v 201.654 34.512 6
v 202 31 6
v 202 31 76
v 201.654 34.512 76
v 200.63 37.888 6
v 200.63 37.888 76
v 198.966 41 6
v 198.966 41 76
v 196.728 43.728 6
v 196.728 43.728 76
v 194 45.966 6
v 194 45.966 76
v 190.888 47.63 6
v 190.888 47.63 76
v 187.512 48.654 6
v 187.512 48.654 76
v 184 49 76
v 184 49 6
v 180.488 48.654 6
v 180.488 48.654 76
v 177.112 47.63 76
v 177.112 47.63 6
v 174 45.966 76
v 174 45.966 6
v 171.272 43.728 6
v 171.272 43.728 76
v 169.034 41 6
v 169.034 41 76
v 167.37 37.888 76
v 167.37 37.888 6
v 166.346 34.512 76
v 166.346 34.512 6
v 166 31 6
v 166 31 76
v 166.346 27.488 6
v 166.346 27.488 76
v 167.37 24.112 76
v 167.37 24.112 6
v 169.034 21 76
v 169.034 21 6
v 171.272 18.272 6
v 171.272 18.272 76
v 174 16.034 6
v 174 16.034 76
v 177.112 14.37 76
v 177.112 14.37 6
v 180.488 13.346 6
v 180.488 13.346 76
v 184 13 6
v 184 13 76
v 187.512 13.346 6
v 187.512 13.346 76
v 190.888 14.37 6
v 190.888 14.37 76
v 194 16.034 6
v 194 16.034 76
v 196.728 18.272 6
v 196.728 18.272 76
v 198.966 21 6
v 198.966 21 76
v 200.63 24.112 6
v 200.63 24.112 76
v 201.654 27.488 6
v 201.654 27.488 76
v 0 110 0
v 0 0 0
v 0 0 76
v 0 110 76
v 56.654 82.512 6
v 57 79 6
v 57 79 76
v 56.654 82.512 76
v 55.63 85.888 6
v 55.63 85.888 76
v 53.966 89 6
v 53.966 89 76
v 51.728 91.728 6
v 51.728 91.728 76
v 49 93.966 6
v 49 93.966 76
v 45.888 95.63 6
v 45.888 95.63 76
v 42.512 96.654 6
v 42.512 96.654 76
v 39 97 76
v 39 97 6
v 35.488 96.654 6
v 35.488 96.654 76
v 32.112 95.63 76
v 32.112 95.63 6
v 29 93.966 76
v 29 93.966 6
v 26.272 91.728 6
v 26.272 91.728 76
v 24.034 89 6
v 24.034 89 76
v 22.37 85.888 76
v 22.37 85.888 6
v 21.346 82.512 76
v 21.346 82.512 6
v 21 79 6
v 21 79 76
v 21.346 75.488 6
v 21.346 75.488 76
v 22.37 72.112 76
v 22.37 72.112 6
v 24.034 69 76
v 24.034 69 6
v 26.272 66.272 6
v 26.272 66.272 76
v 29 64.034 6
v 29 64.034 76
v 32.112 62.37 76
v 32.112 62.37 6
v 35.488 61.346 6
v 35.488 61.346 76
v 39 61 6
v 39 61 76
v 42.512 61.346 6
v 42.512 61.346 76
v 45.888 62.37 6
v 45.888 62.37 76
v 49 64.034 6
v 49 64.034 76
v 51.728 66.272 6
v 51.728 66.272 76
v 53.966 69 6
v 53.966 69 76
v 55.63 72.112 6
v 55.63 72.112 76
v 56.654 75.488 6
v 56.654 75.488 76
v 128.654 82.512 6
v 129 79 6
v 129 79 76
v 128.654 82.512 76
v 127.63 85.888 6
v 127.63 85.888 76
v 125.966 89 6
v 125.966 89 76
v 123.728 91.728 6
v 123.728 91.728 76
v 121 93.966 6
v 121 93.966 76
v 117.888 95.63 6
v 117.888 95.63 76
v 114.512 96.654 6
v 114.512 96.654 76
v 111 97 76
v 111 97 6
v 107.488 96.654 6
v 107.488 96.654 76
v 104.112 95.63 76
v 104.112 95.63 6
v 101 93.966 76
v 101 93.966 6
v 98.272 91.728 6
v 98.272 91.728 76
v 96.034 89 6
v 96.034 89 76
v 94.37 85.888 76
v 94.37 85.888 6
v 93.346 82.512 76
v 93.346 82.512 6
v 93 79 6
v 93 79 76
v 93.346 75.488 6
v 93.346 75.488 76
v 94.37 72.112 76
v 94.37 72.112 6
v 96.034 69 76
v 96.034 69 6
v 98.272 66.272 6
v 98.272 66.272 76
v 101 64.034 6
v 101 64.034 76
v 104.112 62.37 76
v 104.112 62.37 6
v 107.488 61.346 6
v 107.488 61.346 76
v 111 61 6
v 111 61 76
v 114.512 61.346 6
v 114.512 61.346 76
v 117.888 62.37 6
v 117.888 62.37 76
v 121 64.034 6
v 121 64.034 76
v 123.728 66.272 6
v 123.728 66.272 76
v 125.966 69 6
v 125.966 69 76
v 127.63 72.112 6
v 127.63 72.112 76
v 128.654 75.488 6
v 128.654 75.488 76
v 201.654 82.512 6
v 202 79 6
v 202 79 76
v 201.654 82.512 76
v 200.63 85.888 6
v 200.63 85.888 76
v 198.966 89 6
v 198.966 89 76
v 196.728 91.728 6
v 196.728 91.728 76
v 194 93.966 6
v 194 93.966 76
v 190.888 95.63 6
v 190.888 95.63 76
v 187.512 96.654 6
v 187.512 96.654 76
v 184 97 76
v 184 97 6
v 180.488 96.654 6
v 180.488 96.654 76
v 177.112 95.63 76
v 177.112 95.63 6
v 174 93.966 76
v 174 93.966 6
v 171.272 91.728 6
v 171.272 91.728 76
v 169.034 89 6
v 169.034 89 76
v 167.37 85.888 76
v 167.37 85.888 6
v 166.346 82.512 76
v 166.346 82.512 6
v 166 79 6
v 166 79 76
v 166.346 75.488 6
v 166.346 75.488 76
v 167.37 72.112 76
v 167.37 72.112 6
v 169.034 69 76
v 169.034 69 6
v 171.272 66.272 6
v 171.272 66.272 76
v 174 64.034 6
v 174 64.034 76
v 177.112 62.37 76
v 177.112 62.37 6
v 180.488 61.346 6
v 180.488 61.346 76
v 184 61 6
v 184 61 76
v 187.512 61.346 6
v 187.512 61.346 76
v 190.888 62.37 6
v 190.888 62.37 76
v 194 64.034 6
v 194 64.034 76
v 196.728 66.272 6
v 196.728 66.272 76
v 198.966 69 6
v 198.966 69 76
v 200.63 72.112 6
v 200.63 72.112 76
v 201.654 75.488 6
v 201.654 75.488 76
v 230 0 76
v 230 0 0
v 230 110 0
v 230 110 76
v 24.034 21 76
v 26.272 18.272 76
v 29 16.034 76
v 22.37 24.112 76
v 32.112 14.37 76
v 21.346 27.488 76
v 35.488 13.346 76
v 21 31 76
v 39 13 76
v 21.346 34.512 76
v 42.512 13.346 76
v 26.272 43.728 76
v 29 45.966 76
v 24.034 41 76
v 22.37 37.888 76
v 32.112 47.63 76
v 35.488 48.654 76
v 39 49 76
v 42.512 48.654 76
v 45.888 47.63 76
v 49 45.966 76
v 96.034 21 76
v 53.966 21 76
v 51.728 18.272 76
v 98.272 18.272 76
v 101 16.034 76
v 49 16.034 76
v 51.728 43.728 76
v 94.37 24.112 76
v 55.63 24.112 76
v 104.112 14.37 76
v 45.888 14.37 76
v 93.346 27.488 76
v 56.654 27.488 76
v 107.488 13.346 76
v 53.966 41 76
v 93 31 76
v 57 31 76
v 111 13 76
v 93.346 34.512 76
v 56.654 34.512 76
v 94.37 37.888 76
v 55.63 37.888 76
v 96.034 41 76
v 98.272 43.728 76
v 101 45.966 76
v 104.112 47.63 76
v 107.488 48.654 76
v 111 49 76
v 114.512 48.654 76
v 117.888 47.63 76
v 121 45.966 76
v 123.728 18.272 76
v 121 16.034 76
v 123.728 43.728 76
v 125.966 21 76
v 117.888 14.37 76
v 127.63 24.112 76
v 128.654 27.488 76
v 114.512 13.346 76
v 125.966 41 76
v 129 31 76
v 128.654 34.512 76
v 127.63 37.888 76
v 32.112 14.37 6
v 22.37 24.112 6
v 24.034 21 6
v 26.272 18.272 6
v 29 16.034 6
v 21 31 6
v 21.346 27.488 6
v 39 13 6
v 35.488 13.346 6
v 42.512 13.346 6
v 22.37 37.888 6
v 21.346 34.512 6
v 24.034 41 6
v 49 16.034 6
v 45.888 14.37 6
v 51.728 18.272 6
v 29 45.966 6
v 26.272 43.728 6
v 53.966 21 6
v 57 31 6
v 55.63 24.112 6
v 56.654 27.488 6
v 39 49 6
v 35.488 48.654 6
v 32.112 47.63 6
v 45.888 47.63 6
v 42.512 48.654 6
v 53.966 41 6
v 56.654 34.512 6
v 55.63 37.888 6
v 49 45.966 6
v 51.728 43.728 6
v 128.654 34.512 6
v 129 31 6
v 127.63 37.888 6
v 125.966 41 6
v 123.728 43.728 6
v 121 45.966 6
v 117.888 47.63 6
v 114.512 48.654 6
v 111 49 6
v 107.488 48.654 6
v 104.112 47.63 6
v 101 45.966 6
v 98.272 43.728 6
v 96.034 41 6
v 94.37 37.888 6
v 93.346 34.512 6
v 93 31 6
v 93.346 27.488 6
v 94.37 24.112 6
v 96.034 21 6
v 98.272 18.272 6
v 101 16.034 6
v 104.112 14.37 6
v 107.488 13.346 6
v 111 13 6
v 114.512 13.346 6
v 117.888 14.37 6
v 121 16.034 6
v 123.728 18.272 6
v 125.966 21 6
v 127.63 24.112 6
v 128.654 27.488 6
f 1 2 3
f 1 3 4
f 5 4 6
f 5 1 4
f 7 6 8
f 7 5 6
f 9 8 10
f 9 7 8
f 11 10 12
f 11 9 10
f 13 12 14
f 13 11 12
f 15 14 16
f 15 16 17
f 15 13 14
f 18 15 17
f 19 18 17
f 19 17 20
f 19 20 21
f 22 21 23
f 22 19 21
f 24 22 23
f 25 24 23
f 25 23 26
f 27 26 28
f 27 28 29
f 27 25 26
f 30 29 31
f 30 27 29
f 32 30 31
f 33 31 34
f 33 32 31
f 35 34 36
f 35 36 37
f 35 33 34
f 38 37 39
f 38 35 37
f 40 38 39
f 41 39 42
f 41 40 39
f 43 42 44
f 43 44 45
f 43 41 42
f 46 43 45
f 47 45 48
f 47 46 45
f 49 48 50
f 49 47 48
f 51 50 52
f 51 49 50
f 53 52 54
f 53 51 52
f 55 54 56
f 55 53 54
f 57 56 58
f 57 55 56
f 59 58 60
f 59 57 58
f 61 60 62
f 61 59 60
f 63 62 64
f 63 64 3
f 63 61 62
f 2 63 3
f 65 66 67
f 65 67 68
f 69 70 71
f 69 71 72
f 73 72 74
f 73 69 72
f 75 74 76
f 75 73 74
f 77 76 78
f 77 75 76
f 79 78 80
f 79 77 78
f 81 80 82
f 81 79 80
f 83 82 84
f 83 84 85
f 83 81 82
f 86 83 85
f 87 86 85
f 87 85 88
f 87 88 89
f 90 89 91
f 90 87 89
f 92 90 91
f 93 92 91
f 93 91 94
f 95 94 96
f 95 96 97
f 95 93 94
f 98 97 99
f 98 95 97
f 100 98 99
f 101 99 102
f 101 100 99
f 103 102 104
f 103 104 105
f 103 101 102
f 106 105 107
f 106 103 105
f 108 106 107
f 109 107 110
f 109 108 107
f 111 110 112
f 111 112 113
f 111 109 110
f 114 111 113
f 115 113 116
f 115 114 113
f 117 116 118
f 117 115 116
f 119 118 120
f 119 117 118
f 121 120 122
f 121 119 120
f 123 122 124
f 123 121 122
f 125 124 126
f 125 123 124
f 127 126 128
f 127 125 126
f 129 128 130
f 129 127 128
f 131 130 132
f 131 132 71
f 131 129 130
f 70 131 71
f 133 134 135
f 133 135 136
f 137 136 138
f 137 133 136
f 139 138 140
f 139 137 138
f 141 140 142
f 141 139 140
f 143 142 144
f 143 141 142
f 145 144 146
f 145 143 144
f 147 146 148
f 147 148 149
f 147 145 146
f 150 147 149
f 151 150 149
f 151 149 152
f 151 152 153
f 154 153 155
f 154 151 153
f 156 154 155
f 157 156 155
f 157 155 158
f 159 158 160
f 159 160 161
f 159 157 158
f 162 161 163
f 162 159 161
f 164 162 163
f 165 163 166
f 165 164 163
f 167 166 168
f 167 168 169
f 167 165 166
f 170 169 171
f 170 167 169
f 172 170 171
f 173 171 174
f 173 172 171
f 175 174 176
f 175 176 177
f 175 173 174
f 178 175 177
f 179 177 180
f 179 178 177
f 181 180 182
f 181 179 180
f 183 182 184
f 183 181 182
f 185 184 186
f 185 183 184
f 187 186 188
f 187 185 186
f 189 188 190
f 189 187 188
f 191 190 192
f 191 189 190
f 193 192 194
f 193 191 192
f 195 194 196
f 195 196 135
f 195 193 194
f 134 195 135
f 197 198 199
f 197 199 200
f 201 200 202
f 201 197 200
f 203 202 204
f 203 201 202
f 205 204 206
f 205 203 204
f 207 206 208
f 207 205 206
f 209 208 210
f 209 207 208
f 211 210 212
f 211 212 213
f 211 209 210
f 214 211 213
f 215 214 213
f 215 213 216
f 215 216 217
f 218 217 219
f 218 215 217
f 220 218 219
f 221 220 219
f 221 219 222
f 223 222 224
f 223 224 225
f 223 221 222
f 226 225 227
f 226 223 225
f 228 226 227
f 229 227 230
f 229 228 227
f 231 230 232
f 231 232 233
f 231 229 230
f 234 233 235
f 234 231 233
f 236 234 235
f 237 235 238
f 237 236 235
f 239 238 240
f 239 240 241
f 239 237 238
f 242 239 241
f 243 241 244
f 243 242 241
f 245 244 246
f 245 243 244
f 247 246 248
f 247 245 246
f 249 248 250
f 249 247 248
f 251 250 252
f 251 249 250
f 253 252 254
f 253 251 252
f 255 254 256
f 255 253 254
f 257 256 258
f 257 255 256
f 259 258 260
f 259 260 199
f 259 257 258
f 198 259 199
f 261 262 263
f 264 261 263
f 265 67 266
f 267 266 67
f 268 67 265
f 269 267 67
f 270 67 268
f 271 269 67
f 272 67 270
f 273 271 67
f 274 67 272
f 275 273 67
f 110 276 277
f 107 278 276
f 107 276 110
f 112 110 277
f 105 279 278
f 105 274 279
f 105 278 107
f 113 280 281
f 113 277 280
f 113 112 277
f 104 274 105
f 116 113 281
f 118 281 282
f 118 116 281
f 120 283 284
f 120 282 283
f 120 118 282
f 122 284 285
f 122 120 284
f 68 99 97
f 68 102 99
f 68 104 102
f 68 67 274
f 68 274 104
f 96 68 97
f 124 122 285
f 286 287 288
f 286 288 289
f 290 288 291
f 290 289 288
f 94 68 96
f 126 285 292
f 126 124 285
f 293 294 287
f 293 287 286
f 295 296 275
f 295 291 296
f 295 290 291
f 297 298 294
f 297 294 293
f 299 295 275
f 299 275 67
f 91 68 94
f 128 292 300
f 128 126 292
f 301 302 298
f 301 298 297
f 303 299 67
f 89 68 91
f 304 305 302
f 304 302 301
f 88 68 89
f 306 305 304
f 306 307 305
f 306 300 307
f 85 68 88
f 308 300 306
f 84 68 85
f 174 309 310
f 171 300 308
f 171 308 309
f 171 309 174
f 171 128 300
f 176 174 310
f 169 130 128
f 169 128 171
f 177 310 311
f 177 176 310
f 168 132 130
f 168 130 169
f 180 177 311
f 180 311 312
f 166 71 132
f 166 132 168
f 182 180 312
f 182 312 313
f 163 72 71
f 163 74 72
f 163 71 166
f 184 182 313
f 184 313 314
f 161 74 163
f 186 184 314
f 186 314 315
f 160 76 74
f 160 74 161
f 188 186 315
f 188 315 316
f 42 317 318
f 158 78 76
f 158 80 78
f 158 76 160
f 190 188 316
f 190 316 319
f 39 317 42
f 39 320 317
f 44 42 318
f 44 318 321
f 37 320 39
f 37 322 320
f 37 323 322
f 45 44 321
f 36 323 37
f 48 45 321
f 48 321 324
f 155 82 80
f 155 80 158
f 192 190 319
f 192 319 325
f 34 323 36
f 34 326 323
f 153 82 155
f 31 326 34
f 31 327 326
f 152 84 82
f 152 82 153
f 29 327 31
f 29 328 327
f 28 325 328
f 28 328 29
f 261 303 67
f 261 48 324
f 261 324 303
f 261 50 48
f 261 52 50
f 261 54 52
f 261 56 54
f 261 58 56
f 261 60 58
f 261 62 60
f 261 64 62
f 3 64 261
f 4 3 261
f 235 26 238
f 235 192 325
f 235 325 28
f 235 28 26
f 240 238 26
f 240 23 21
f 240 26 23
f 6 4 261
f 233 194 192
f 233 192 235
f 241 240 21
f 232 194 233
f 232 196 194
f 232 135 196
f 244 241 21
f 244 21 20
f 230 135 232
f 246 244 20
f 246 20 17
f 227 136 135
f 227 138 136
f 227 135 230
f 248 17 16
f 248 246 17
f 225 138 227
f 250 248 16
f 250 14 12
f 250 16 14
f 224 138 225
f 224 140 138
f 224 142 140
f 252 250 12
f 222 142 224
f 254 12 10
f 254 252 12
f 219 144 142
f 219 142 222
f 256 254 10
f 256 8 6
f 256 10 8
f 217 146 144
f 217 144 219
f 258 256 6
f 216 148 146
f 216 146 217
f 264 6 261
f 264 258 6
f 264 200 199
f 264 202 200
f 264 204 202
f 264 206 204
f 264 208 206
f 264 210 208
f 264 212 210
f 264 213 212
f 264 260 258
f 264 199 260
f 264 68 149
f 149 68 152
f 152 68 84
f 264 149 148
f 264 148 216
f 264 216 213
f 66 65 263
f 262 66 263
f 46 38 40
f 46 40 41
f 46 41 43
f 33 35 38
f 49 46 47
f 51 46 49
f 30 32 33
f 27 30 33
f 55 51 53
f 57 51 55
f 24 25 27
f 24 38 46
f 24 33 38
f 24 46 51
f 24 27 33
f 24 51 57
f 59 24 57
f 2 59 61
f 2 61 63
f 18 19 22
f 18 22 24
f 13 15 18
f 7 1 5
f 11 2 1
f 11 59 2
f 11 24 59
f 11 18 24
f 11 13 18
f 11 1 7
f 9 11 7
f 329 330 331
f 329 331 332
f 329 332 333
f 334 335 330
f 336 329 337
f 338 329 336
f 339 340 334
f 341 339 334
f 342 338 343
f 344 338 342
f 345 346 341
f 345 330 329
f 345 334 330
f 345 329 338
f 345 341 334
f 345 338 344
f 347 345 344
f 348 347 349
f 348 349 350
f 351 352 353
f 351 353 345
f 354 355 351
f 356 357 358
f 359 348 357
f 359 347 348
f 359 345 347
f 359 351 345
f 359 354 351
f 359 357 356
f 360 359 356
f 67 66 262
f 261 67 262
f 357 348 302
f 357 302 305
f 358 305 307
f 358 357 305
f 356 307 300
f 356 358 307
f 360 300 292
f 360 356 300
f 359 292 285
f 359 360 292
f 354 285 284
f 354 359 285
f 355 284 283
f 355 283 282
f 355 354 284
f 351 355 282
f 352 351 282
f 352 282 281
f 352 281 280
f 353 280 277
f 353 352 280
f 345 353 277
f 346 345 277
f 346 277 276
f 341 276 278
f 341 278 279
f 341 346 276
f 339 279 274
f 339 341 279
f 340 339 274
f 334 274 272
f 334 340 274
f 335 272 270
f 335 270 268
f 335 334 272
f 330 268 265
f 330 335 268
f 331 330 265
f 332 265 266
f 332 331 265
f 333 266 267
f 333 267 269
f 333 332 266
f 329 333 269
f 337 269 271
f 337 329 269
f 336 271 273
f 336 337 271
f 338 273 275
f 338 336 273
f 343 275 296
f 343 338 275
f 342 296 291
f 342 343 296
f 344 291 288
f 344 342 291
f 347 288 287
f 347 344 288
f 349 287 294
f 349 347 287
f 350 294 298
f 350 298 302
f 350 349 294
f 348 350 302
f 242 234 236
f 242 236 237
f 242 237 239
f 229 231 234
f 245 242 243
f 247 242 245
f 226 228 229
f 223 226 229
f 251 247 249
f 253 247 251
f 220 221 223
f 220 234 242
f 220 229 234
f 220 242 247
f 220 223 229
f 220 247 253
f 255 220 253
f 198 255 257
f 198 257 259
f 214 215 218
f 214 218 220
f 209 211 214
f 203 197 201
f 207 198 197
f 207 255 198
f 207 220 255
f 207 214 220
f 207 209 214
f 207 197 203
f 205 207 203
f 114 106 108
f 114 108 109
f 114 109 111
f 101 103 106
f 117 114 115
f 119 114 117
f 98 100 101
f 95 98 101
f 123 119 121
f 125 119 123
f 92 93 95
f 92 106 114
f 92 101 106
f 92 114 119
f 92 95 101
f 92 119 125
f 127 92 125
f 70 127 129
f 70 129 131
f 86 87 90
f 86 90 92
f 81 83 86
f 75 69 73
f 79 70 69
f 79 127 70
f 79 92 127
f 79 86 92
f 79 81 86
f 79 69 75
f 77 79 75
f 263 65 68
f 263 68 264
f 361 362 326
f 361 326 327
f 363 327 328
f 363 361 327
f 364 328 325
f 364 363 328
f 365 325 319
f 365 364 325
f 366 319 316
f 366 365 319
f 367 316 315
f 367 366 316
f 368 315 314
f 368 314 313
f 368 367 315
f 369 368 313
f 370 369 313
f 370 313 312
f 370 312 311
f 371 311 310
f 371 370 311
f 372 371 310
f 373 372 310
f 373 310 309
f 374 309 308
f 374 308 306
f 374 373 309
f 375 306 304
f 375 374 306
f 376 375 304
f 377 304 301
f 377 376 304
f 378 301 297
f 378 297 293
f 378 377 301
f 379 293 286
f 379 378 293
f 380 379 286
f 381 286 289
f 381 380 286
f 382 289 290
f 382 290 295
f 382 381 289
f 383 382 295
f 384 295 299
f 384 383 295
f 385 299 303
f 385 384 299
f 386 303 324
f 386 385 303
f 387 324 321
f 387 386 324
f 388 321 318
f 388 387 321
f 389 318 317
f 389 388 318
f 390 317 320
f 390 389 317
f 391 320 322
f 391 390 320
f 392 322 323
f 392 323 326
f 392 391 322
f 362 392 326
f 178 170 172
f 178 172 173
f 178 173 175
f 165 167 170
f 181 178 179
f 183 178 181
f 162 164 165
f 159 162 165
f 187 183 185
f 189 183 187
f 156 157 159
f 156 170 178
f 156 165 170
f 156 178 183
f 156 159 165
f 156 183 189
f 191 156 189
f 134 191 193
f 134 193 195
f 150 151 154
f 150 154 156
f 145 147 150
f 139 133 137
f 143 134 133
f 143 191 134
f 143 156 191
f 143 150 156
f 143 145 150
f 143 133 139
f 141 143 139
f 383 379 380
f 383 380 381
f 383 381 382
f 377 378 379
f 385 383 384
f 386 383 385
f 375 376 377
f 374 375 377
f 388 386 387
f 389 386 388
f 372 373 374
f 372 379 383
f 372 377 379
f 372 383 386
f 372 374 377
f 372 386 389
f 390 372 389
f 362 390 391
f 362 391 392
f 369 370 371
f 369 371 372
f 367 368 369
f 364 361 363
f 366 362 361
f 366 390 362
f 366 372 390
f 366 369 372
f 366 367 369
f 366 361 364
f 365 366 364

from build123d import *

# Parameters (mm, degrees)
CYLINDER001_R     = 18
CYLINDER001_DEPTH = 70
CYLINDER_R        = 18
CYLINDER_DEPTH    = 70
CYLINDER005_R     = 18
CYLINDER005_DEPTH = 70
CYLINDER004_R     = 18
CYLINDER004_DEPTH = 70
CYLINDER003_R     = 18
CYLINDER003_DEPTH = 70
CYLINDER002_R     = 18
CYLINDER002_DEPTH = 70
BOX_W             = 230
BOX_H             = 110
BOX_DEPTH         = 76


with BuildPart() as cylinder001:
    # Cylinder001 → Cylinder001 (new body)
    with BuildSketch(Plane(origin=(39, 79, 6), x_dir=(1, 0, 0), z_dir=(0, 0, 1))):
        Circle(CYLINDER001_R)
    extrude(amount=CYLINDER001_DEPTH)


with BuildPart() as fusion:
    # Cylinder → Cylinder (new body)
    with BuildSketch(Plane(origin=(39, 31, 6), x_dir=(1, 0, 0), z_dir=(0, 0, 1))):
        Circle(CYLINDER_R)
    extrude(amount=CYLINDER_DEPTH)

    # Fusion: union Cylinder001
    add(cylinder001.part)


with BuildPart() as cylinder005:
    # Cylinder005 → Cylinder005 (new body)
    with BuildSketch(Plane(origin=(39, 79, 6), x_dir=(1, 0, 0), z_dir=(0, 0, 1))):
        Circle(CYLINDER005_R)
    extrude(amount=CYLINDER005_DEPTH)


with BuildPart() as fusion002:
    # Cylinder004 → Cylinder004 (new body)
    with BuildSketch(Plane(origin=(39, 31, 6), x_dir=(1, 0, 0), z_dir=(0, 0, 1))):
        Circle(CYLINDER004_R)
    extrude(amount=CYLINDER004_DEPTH)

    # Fusion002: union Cylinder005
    add(cylinder005.part)


with BuildPart() as fusion002_1:
    # Fusion002 placement: moved
    add(fusion002.part.moved(Location((145, 0, 0))))


with BuildPart() as cylinder003:
    # Cylinder003 → Cylinder003 (new body)
    with BuildSketch(Plane(origin=(39, 79, 6), x_dir=(1, 0, 0), z_dir=(0, 0, 1))):
        Circle(CYLINDER003_R)
    extrude(amount=CYLINDER003_DEPTH)


with BuildPart() as fusion003:
    # Cylinder002 → Cylinder002 (new body)
    with BuildSketch(Plane(origin=(39, 31, 6), x_dir=(1, 0, 0), z_dir=(0, 0, 1))):
        Circle(CYLINDER002_R)
    extrude(amount=CYLINDER002_DEPTH)

    # Fusion001: union Cylinder003
    add(cylinder003.part)


with BuildPart() as fusion003_1:
    # Fusion001 placement: moved
    add(fusion003.part.moved(Location((72, 0, 0))))

    # Fusion003: union Fusion, Fusion002
    add(fusion.part)
    add(fusion002_1.part)


with BuildPart() as cut:
    # Box → Box (new body)
    with BuildSketch(Plane.XY):
        with Locations((115, 55)):
            Rectangle(BOX_W, BOX_H)
    extrude(amount=BOX_DEPTH)

    # Cut: cut Fusion003
    add(fusion003_1.part, mode=Mode.SUBTRACT)


solid = cut.part
